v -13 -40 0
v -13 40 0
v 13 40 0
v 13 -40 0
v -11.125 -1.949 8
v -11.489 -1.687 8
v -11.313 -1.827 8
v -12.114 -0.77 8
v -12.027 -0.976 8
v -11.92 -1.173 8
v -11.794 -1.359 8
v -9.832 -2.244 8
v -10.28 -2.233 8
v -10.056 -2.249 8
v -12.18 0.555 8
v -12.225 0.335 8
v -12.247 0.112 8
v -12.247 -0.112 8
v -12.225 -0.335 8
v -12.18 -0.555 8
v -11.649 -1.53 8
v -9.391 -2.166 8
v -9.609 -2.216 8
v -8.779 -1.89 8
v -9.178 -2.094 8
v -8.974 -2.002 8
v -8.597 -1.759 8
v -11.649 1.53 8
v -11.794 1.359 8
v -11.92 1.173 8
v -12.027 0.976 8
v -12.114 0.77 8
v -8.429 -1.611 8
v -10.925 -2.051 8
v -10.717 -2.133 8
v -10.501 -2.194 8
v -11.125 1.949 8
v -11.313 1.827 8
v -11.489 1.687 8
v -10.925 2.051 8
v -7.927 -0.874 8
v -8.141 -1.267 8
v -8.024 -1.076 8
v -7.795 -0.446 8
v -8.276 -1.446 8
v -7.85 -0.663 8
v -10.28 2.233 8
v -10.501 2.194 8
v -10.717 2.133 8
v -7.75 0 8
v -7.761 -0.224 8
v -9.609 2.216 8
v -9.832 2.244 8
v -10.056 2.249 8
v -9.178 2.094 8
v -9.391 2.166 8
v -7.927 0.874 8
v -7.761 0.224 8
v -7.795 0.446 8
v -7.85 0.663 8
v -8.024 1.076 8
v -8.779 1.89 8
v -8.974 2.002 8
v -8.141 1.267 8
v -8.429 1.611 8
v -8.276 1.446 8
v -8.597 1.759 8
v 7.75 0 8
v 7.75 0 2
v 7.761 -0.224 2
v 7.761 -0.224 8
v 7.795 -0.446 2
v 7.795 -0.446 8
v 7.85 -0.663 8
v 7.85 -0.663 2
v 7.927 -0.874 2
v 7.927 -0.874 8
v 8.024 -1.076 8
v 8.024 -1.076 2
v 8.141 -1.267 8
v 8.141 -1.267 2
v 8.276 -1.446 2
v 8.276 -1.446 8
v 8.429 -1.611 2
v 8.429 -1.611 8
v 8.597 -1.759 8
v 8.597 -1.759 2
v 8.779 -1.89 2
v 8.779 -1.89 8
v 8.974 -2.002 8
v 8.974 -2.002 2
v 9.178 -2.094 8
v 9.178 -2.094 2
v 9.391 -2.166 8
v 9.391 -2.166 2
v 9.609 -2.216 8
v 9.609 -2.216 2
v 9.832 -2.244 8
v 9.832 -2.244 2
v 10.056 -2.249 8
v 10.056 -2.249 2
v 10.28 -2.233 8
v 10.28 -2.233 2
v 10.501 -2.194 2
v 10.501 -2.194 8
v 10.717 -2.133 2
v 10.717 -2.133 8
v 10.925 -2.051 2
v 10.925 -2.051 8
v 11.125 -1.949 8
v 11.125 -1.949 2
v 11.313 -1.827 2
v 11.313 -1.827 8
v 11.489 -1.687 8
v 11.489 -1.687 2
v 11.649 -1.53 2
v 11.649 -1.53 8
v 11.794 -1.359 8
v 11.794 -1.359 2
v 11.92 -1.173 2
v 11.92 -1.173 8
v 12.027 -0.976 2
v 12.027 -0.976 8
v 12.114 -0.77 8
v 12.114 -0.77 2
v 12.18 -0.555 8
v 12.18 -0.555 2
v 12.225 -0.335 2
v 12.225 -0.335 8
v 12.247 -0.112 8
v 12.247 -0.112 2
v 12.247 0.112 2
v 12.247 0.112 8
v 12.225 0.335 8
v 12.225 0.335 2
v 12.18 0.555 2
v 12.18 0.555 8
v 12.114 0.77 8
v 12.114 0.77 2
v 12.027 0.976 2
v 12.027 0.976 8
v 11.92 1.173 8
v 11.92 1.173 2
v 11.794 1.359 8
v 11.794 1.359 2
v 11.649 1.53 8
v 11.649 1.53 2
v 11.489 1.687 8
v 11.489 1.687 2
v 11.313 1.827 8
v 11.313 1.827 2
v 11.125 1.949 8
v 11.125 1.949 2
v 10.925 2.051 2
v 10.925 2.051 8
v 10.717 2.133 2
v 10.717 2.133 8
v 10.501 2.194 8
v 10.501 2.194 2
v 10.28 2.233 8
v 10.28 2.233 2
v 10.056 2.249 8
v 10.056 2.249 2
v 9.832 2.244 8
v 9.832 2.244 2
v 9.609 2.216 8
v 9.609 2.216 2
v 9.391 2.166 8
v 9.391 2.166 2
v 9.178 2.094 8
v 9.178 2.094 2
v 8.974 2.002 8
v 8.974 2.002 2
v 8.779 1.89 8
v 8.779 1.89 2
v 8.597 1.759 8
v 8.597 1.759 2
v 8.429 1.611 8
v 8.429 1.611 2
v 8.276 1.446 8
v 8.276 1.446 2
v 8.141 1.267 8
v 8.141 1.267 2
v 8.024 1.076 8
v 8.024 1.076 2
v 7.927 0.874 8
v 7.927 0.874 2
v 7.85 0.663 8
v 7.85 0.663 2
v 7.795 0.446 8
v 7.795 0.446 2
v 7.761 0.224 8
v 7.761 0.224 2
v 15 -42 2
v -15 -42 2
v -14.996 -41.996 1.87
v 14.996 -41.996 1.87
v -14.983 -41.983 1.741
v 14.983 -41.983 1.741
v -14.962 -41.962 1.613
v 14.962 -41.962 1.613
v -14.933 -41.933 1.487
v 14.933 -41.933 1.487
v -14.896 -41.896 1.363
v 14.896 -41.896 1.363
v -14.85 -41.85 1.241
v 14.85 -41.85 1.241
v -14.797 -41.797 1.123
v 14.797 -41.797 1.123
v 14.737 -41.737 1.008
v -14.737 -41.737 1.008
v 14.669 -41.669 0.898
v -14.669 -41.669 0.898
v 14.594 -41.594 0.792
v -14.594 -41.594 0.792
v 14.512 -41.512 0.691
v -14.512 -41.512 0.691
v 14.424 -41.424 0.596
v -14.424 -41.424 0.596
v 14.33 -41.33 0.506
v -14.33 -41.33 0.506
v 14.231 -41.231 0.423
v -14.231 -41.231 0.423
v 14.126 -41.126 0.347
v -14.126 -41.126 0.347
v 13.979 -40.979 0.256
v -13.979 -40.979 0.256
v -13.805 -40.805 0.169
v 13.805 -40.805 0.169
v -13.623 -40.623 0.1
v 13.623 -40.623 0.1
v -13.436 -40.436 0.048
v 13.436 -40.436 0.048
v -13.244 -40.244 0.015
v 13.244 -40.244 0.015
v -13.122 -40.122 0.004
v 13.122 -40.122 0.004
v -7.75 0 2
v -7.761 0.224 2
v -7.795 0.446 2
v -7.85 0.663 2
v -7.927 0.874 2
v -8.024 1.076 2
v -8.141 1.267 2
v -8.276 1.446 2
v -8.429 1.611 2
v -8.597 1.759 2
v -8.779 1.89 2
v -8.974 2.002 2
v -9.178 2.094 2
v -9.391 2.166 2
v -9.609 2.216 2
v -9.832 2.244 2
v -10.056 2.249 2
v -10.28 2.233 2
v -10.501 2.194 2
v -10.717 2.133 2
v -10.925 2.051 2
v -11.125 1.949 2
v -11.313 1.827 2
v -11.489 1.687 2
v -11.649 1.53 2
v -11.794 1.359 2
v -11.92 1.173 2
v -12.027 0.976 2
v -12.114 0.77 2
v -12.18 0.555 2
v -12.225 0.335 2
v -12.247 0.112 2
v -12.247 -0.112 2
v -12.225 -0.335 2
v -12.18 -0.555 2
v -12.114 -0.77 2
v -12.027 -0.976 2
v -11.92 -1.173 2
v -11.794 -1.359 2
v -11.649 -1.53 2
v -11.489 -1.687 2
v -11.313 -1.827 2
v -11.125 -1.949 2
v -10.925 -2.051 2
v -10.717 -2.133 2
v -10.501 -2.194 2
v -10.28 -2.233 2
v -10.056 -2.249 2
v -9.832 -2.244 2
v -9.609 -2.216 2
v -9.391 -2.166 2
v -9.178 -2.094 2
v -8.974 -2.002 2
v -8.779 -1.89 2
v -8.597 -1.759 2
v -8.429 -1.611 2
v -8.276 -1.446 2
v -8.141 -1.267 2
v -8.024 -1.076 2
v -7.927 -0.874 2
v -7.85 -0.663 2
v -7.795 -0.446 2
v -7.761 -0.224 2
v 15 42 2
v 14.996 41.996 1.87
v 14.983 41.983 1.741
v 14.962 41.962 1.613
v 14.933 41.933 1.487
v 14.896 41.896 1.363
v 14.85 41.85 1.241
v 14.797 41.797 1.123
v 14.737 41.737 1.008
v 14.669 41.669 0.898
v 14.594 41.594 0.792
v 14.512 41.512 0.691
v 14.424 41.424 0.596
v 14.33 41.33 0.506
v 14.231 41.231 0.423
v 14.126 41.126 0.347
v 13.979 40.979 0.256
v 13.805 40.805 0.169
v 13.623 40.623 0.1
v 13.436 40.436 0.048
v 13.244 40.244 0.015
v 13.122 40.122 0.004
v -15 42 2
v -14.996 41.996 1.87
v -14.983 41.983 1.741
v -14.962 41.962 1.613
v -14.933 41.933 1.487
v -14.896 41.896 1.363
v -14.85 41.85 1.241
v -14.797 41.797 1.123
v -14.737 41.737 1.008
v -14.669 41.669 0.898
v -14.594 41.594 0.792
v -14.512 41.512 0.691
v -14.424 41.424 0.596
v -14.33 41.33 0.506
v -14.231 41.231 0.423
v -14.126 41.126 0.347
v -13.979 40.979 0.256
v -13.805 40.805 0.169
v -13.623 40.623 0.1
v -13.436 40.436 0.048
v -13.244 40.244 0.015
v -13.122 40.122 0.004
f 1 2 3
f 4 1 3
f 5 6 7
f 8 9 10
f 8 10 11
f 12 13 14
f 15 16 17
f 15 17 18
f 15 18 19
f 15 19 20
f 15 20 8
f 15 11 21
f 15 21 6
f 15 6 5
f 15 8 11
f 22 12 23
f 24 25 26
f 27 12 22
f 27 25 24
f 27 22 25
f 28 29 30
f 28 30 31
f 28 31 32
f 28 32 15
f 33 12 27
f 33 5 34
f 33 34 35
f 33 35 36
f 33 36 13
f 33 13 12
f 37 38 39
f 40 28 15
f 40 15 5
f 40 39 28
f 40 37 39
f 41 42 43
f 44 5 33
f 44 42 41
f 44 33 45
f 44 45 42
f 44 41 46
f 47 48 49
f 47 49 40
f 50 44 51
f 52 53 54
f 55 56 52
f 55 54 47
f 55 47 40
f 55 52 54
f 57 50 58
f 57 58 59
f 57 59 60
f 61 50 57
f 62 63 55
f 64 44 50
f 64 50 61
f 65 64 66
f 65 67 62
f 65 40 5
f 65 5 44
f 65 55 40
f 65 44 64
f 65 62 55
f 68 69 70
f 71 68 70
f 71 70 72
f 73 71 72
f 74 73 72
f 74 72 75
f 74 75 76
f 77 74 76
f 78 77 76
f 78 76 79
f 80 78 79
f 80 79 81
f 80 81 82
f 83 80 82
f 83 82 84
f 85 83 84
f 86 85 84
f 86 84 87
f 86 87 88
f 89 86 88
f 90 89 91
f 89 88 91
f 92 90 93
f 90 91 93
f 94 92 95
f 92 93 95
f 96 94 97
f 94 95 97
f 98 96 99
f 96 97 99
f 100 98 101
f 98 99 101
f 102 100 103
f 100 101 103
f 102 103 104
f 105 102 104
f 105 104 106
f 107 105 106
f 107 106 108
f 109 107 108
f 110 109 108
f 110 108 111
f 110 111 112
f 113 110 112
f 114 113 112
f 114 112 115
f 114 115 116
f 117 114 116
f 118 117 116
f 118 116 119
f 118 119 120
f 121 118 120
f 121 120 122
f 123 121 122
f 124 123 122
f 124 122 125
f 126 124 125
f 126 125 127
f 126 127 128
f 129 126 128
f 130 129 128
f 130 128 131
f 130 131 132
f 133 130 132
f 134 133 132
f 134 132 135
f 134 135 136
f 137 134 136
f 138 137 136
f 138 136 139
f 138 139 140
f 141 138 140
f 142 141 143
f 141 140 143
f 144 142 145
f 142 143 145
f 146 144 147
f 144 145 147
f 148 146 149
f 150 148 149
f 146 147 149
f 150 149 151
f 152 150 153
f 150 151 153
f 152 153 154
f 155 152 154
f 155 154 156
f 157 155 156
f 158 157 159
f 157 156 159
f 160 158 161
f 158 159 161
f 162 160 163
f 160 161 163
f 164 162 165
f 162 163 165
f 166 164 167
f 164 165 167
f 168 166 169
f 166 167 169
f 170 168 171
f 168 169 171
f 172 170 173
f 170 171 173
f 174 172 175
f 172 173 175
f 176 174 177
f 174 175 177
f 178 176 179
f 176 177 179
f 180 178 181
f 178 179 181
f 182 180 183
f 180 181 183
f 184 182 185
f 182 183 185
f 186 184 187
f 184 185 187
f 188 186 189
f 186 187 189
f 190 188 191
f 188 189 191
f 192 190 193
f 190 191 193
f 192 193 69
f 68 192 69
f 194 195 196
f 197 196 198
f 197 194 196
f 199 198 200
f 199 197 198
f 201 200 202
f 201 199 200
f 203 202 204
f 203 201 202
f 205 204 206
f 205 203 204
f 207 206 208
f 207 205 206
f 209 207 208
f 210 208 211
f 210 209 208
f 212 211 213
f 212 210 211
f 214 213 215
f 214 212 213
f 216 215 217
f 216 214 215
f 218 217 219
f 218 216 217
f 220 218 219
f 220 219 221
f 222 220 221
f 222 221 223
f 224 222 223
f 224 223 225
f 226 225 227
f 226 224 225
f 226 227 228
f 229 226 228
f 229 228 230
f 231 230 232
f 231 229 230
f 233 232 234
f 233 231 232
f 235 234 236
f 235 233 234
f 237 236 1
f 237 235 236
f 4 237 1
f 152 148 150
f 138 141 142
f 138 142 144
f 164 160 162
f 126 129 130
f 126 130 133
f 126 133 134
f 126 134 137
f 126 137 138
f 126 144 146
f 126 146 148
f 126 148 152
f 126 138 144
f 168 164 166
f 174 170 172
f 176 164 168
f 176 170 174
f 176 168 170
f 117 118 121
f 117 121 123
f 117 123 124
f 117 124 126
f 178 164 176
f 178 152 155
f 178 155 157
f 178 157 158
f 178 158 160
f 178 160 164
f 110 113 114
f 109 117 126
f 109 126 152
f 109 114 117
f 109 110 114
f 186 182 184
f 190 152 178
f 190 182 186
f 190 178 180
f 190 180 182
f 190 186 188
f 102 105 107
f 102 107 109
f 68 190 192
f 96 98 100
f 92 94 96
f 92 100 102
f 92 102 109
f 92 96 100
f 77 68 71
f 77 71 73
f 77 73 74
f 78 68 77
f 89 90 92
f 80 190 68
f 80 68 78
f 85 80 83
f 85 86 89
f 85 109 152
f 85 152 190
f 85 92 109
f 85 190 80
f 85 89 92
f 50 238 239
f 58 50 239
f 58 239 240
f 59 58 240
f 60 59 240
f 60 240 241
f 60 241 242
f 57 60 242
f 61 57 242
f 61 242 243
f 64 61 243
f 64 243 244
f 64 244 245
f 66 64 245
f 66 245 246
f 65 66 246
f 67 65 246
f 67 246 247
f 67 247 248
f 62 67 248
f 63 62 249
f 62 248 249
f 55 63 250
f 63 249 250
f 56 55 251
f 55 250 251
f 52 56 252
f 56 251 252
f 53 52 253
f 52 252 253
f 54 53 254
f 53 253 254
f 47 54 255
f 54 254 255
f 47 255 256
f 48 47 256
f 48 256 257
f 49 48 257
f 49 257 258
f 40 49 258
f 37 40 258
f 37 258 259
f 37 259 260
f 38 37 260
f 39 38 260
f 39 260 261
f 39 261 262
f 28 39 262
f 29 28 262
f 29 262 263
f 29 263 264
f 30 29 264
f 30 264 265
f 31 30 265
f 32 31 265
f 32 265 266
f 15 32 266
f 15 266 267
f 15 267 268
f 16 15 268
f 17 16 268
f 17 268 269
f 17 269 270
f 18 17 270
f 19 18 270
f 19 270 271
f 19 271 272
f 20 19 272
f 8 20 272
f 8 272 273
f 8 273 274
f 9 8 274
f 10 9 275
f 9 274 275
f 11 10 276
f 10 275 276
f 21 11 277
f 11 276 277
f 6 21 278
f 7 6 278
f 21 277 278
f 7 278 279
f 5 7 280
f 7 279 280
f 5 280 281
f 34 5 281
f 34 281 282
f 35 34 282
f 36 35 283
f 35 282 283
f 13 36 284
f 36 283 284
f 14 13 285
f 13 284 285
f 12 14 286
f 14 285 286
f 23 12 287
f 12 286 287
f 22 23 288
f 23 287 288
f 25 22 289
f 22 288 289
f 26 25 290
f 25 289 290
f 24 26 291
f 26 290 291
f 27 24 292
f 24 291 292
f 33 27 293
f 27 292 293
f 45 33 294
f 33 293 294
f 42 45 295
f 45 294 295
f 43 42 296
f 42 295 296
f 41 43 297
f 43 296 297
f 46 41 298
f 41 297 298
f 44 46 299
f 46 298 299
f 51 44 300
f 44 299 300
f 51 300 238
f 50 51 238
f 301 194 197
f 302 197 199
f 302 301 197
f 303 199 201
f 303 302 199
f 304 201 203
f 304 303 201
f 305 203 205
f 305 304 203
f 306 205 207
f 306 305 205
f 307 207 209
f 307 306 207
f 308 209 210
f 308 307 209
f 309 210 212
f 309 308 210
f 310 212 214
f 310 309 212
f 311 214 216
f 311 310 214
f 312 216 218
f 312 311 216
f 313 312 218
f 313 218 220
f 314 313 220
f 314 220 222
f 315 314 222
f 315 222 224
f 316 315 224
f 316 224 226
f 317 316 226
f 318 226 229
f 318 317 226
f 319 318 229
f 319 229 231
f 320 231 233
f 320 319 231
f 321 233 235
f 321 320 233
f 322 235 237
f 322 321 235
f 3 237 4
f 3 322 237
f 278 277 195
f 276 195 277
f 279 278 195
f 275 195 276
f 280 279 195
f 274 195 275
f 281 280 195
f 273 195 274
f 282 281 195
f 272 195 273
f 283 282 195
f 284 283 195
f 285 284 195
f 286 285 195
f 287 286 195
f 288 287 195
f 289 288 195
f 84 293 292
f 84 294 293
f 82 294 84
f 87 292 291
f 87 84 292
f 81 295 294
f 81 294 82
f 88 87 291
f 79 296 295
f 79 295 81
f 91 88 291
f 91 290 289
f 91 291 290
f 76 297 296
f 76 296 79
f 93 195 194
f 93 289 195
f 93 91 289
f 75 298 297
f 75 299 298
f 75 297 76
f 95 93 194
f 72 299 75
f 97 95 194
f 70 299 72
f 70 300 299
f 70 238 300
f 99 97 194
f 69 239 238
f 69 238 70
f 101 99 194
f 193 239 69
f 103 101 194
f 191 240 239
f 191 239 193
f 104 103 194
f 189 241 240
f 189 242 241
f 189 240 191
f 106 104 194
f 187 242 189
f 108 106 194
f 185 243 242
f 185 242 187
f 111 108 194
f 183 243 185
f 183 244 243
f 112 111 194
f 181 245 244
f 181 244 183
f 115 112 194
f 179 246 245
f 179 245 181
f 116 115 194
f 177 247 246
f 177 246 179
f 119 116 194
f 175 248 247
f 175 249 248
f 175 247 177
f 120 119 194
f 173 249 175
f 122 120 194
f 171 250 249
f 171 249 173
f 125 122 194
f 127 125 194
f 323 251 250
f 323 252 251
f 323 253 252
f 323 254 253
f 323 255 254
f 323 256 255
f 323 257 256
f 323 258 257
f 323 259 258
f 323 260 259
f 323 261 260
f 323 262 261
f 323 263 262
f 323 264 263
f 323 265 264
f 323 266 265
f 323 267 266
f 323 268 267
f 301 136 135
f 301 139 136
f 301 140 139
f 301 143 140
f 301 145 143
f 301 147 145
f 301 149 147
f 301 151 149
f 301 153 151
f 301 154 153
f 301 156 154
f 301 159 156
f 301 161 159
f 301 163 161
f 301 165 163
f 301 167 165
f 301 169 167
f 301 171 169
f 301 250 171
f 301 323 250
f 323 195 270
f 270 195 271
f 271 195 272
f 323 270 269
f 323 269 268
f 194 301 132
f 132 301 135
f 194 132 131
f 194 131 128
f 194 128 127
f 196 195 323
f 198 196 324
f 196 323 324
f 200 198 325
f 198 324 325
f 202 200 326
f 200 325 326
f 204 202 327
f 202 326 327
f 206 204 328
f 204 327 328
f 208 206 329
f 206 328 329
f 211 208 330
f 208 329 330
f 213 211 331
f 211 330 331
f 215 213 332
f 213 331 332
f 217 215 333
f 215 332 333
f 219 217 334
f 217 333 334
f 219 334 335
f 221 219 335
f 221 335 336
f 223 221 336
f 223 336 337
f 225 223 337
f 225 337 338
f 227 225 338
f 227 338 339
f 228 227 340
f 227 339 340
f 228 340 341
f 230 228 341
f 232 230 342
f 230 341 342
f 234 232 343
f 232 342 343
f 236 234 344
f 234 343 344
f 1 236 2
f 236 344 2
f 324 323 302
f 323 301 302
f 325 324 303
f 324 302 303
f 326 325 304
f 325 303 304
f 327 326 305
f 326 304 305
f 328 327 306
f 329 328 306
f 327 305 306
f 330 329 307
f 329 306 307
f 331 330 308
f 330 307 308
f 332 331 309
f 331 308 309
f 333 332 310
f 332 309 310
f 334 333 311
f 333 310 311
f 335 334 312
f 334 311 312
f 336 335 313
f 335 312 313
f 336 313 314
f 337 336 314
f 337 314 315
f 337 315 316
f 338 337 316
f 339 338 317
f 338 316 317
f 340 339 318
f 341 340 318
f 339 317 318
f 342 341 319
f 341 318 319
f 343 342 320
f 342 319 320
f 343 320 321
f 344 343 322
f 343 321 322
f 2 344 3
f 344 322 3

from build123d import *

# Parameters (mm, degrees)
SKETCH1_W           = 30
SKETCH1_H           = 84
SKETCH1_R           = 2.25
BOSS_EXTRUDE1_DEPTH = 2
SKETCH1_4_R         = 2.25
BOSS_EXTRUDE2_DEPTH = 8
FILLET1_R           = 2


with BuildPart() as part:
    # Sketch1 → Boss-Extrude1 (new body)
    with BuildSketch(Plane.XY):
        Rectangle(SKETCH1_W, SKETCH1_H)
        with Locations((-10, 0)):
            Circle(SKETCH1_R, mode=Mode.SUBTRACT)
        with Locations(Location((10, 0, 0), (0, 0, 180))):
            Circle(SKETCH1_R, mode=Mode.SUBTRACT)
    extrude(amount=BOSS_EXTRUDE1_DEPTH)

    # Sketch1<4> → Boss-Extrude2 (add)
    with BuildSketch(Plane.XY):
        with Locations((-10, 0)):
            Circle(SKETCH1_4_R)
        with Locations(Location((10, 0, 0), (0, 0, 180))):
            Circle(SKETCH1_4_R)
    extrude(amount=BOSS_EXTRUDE2_DEPTH)

    # Fillet1
    fillet1_edges = [part.edges().sort_by_distance(p)[0] for p in [
        (0, 42, 0),
        (-15, 0, 0),
        (0, -42, 0),
        (15, 0, 0),
    ]]
    fillet(fillet1_edges, radius=FILLET1_R - 0.0001)  # a hair under: the kernel refuses the full size


solid = part.part
